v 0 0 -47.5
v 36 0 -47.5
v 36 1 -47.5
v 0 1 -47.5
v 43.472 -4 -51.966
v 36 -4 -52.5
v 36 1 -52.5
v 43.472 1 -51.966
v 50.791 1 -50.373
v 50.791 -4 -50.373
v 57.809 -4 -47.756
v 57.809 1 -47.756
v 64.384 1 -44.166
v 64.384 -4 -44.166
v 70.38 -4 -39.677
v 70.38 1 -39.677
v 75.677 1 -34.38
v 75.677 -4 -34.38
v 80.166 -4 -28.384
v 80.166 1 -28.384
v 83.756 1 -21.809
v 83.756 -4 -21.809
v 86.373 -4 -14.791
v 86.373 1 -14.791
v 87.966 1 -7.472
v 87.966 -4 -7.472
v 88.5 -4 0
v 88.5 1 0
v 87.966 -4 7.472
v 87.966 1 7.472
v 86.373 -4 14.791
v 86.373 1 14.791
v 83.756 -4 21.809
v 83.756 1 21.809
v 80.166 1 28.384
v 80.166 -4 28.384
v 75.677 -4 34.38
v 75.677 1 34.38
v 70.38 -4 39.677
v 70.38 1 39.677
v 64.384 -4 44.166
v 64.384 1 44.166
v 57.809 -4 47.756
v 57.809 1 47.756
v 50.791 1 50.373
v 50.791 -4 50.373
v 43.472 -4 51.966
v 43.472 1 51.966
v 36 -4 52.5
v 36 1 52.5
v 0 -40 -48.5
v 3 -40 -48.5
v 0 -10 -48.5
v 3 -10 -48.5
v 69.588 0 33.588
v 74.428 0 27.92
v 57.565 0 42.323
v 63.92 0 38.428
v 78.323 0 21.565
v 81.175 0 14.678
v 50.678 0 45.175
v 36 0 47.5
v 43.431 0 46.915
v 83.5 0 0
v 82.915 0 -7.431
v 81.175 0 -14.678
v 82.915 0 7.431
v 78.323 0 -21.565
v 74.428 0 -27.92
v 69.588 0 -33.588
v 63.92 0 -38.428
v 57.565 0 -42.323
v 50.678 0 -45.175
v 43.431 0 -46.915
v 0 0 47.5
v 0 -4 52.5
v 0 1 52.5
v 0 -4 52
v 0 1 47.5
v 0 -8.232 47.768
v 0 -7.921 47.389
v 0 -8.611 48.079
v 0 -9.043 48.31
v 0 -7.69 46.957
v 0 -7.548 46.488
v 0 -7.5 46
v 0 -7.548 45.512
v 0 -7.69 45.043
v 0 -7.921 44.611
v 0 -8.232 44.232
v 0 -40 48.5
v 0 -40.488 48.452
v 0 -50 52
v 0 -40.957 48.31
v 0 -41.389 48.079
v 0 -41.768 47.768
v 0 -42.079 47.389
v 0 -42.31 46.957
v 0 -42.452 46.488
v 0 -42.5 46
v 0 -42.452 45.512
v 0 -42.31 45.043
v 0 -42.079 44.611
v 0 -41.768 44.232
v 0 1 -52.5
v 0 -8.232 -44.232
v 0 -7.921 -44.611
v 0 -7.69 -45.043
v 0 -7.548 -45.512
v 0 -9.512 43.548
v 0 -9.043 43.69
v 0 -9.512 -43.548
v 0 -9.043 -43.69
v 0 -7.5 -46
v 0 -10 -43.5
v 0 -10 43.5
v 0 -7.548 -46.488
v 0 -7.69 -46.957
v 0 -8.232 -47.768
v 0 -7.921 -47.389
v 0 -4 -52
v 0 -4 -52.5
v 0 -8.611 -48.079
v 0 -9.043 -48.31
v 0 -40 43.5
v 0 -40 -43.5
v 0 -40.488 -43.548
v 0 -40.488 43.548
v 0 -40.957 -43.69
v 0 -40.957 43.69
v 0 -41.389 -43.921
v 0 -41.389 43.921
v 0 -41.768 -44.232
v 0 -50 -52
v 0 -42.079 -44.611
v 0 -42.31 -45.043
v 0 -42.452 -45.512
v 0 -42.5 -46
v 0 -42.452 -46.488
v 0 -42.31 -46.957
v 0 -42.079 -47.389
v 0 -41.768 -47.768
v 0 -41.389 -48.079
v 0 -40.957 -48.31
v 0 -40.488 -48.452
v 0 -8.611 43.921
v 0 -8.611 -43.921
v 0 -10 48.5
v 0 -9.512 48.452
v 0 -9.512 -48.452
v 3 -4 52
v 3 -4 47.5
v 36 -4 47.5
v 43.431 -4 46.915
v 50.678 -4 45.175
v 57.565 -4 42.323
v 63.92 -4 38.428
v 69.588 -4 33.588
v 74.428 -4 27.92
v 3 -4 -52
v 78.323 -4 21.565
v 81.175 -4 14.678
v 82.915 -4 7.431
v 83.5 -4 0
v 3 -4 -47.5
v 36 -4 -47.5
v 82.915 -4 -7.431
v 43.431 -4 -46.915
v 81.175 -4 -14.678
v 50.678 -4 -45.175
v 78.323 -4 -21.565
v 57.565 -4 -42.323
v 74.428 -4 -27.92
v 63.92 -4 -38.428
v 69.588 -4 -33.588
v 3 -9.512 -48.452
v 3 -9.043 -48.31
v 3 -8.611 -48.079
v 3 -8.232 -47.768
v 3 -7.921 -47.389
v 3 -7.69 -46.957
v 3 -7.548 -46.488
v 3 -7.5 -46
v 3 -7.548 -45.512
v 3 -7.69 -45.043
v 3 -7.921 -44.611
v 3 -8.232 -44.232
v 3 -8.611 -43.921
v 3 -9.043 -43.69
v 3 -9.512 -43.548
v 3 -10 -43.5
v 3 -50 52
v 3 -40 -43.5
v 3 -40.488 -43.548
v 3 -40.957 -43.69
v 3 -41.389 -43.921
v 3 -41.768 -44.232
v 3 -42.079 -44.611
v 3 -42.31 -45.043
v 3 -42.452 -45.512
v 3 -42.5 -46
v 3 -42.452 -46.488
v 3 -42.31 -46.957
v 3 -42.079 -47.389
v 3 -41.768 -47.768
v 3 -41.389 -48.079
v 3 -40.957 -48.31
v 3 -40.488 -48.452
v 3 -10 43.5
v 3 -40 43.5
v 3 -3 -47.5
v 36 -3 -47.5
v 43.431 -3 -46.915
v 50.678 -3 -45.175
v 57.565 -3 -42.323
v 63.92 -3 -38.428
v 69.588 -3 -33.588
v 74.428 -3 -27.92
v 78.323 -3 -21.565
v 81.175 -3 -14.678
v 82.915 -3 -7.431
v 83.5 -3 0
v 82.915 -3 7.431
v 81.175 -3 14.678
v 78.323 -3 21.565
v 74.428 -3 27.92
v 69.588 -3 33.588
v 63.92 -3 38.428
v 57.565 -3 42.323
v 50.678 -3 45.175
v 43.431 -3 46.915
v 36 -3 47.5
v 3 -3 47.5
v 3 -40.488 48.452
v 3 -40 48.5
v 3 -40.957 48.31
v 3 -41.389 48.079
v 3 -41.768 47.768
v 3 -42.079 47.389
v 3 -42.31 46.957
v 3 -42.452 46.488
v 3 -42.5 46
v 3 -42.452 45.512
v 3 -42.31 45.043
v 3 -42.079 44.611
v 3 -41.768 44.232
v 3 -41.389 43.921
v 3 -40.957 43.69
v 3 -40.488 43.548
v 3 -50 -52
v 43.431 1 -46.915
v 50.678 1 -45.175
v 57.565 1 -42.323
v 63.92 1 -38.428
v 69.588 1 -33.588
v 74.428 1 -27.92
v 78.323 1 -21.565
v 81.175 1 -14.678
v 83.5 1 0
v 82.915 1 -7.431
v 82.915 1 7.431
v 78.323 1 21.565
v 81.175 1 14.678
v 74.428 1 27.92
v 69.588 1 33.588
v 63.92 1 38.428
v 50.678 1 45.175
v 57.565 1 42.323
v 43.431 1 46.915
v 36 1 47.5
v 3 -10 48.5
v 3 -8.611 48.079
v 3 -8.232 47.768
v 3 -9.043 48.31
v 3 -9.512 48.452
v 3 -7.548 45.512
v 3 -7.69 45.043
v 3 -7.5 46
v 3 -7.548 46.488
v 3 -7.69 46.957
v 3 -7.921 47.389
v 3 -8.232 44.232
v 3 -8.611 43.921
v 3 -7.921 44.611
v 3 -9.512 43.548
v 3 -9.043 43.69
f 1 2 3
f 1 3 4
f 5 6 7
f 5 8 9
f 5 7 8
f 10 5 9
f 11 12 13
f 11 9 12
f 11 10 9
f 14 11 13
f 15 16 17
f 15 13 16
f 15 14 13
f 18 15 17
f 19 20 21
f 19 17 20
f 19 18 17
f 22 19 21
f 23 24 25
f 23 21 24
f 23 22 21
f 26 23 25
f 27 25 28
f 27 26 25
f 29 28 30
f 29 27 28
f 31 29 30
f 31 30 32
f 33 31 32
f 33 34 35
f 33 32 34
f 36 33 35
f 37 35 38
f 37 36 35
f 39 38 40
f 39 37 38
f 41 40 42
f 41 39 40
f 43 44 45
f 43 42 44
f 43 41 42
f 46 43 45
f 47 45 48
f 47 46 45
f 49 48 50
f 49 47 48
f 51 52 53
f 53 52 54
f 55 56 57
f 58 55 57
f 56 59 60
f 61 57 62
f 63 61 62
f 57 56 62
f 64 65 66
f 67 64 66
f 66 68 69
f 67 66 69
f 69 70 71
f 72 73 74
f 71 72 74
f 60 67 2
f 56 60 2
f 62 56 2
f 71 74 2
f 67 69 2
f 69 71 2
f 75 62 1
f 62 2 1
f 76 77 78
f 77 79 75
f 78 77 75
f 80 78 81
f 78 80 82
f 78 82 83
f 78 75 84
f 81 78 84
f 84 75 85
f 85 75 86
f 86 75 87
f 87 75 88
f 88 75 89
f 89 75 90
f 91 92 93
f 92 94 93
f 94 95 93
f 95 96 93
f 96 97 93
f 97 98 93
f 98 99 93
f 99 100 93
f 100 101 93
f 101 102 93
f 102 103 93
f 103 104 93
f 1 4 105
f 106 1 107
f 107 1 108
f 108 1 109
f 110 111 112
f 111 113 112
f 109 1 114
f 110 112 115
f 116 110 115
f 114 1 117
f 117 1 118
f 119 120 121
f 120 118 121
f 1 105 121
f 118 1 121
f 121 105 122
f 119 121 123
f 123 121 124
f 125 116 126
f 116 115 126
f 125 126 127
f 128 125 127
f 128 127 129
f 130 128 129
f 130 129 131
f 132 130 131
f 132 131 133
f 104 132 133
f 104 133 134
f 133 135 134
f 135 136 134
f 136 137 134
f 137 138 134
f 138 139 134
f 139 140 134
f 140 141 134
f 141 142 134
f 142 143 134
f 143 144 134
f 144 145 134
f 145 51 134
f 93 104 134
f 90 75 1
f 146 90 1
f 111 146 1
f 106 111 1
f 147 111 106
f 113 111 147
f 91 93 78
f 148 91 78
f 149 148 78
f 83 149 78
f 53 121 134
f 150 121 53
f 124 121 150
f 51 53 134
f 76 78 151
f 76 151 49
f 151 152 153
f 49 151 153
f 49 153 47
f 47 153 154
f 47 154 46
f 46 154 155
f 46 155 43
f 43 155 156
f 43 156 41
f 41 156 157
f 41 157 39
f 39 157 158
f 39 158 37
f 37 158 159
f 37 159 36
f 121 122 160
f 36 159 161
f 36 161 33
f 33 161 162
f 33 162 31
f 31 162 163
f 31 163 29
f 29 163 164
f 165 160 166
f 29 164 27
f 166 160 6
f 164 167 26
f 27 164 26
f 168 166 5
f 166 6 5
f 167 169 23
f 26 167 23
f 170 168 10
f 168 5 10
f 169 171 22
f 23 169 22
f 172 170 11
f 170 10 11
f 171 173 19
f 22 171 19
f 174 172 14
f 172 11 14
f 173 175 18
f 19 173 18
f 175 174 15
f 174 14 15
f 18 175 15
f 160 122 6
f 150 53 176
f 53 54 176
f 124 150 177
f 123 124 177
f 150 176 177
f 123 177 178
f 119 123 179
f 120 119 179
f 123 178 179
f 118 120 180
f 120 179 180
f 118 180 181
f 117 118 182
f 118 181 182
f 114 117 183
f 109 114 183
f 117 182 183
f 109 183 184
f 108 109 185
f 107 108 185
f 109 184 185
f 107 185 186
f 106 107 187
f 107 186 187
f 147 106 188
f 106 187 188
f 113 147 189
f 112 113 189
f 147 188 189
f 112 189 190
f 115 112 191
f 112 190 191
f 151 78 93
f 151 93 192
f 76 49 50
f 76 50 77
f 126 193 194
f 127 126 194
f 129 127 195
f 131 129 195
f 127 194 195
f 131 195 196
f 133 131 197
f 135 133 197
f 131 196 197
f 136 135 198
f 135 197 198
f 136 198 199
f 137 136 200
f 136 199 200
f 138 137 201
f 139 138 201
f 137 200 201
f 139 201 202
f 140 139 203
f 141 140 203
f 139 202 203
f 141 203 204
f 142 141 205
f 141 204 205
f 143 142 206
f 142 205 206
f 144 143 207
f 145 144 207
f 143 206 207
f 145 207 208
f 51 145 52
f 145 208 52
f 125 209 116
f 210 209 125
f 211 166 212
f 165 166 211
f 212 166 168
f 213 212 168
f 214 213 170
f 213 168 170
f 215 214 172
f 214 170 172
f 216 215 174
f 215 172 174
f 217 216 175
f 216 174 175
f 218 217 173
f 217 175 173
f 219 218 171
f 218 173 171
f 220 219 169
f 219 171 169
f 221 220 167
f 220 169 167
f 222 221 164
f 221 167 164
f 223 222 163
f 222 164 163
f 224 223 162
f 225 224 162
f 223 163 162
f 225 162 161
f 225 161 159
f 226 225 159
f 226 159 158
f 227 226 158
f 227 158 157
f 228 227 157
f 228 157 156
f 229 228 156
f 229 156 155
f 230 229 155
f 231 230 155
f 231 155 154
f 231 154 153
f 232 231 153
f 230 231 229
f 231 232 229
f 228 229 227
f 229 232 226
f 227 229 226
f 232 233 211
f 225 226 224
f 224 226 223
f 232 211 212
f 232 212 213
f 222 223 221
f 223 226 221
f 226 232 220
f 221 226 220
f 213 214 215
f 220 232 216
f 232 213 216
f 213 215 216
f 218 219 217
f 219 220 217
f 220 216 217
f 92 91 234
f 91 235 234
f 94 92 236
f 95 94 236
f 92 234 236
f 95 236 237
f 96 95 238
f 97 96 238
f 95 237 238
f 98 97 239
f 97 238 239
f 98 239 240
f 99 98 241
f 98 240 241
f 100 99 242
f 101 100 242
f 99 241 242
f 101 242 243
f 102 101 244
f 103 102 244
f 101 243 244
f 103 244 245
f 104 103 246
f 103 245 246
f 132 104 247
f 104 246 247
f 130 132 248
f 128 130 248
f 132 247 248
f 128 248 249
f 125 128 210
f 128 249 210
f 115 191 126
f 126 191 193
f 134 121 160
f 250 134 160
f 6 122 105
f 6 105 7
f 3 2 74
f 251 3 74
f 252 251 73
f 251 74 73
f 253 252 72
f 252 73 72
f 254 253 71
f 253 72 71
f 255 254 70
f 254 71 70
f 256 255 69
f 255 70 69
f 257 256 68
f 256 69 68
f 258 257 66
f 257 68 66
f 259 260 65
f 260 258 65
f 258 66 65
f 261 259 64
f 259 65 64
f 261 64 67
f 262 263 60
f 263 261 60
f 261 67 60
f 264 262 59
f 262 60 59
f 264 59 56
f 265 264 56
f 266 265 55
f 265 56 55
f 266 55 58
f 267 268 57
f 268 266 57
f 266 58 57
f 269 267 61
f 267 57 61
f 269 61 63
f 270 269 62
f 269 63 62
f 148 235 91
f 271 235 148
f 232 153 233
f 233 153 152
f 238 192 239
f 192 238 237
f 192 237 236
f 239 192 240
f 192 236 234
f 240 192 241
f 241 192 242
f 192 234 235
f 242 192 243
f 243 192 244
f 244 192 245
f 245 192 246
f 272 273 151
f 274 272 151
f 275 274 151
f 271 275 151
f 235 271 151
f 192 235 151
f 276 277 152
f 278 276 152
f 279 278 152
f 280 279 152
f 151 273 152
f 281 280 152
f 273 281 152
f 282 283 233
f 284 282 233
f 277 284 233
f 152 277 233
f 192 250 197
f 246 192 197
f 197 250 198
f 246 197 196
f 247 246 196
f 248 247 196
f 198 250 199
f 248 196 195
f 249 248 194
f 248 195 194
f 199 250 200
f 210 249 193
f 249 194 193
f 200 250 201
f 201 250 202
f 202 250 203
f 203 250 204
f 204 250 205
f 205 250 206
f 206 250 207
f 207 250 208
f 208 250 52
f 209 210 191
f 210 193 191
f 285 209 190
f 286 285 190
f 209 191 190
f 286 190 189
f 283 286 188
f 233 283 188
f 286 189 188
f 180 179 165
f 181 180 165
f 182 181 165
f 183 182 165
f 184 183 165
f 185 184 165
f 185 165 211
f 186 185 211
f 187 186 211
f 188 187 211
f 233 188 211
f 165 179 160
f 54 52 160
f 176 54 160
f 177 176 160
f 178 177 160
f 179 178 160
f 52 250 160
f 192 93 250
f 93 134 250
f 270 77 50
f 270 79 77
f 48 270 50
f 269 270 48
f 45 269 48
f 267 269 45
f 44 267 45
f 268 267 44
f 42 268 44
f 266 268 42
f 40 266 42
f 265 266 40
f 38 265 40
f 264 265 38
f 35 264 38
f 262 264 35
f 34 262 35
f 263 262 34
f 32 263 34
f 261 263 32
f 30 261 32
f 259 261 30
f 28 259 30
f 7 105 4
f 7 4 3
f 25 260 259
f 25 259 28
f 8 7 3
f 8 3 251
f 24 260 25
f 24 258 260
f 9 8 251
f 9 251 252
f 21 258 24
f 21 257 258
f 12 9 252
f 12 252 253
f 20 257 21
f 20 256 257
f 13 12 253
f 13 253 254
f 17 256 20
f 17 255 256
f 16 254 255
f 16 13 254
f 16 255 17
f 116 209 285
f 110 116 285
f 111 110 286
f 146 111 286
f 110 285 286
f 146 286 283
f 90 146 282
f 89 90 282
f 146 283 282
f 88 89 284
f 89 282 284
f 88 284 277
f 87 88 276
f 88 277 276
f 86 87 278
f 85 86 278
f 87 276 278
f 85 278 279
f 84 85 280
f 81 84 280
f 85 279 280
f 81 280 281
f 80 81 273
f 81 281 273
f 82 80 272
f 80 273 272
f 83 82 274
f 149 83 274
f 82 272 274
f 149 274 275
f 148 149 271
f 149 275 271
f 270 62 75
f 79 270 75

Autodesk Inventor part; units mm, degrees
ref_plane "YZ Plane" through (0, 0, 0) normal (1, 0, 0) x (0, 1, 0)
ref_plane "XZ Plane" through (0, 0, 0) normal (0, 1, 0) x (-1, 0, 0)
ref_plane "XY Plane" through (0, 0, 0) normal (0, 0, 1) x (1, 0, 0)
sketch "Skizze1" plane through (0, 0, 0) normal (0, 0, 1) x (1, 0, 0)
  line L0 (0, 0) -> (0, -50)
  line L1 (0, 0) -> (50, 0) construction
  line L2 (0, -50) -> (3, -50)
  line L3 (3, -50) -> (3, -3)
  line L4 (3, -3) -> (88, -3)
  line L5 (88, -3) -> (88, 0)
  line L6 (88, 0) -> (0, 0)
  dimension "d0" = 50
  dimension "d1" = 90
  dimension "d2" = 3
  dimension "d3" = 47
  dimension "d4" = 85
  dimension "d5" = 90
extrude "Extrusion1" add sketch "Skizze1" along normal mid plane 104
fillet "Rundung1" radius 52 2 edges at (88, -1.5, -52) (88, -1.5, 52)
sketch "Skizze2" plane through (3, -50, 52) normal (1, 0, 0) x (0, 0, -1)
  line L0 (3.5, 40) -> (8.5, 40)
  line L1 (8.5, 40) -> (8.5, 10)
  line L2 (8.5, 10) -> (3.5, 10)
  line L3 (3.5, 10) -> (3.5, 40)
  arc A0 (8.5, 40) -> (3.5, 40) centre (6, 40) ccw
  arc A1 (3.5, 10) -> (8.5, 10) centre (6, 10) ccw
  line L4 (0, 0) -> (0, 47) projected
  point P0 (52, 50)
  dimension "d9" = 5
  dimension "d10" = 30
  dimension "d27" = 6
extrude "Extrusion2" cut sketch "Skizze2" against normal blind 3
sketch "Skizze3" plane through (3, -50, 52) normal (1, 0, 0) x (0, 0, -1)
  line L0 (100.5, 40) -> (95.5, 40)
  line L1 (95.5, 40) -> (95.5, 10)
  line L2 (95.5, 10) -> (100.5, 10)
  line L3 (100.5, 10) -> (100.5, 40)
  arc A0 (100.5, 40) -> (95.5, 40) centre (98, 40) ccw
  arc A1 (95.5, 10) -> (100.5, 10) centre (98, 10) ccw
  line L4 (104, 47) -> (104, 0) projected
  point P0 (52, 50)
  dimension "d13" = 5
  dimension "d14" = 30
  dimension "d28" = 6
extrude "Extrusion3" cut sketch "Skizze3" against normal blind 3
sketch "Skizze4" plane through (0, 0, 52) normal (0, 1, 0) x (1, 0, 0)
  arc A0 (36, -0.5) -> (36, 104.5) centre (36, 52) ccw
  line L0 (36, 52) -> (36, -0.5) construction
  line L1 (36, 52) -> (88.5, 52) construction
  line L2 (36, 52) -> (36, 104.5) construction
  arc A1 (36, 4.5) -> (36, 99.5) centre (36, 52) ccw
  line L3 (36, 52) -> (36, 4.5) construction
  line L4 (36, 52) -> (83.5, 52) construction
  line L5 (36, 99.5) -> (0, 99.5)
  line L6 (0, 95.5) -> (0, 100.5) projected
  line L7 (36, 104) -> (3, 104) projected
  line L8 (36, -0.5) -> (0, -0.5)
  line L9 (0, -0.5) -> (0, 4.5)
  line L10 (36, 4.5) -> (0, 4.5)
  line L11 (0, 99.5) -> (0, 104.5)
  line L12 (0, 104.5) -> (36, 104.5)
  line L13 (0, 0) -> (0, 104) projected
  point P0 (0, 52)
  dimension "d17" = 52.5
  dimension "d18" = 90
  dimension "d19" = 180
  dimension "d20" = 47.5
  dimension "d21" = 90
extrude "Extrusion4" add sketch "Skizze4" along normal blind 1 and the other way blind 4 contours L8 L9 L10 A1 L5 L6 L11 L12 A0
properties part number "Glas und Flaschenboden"
